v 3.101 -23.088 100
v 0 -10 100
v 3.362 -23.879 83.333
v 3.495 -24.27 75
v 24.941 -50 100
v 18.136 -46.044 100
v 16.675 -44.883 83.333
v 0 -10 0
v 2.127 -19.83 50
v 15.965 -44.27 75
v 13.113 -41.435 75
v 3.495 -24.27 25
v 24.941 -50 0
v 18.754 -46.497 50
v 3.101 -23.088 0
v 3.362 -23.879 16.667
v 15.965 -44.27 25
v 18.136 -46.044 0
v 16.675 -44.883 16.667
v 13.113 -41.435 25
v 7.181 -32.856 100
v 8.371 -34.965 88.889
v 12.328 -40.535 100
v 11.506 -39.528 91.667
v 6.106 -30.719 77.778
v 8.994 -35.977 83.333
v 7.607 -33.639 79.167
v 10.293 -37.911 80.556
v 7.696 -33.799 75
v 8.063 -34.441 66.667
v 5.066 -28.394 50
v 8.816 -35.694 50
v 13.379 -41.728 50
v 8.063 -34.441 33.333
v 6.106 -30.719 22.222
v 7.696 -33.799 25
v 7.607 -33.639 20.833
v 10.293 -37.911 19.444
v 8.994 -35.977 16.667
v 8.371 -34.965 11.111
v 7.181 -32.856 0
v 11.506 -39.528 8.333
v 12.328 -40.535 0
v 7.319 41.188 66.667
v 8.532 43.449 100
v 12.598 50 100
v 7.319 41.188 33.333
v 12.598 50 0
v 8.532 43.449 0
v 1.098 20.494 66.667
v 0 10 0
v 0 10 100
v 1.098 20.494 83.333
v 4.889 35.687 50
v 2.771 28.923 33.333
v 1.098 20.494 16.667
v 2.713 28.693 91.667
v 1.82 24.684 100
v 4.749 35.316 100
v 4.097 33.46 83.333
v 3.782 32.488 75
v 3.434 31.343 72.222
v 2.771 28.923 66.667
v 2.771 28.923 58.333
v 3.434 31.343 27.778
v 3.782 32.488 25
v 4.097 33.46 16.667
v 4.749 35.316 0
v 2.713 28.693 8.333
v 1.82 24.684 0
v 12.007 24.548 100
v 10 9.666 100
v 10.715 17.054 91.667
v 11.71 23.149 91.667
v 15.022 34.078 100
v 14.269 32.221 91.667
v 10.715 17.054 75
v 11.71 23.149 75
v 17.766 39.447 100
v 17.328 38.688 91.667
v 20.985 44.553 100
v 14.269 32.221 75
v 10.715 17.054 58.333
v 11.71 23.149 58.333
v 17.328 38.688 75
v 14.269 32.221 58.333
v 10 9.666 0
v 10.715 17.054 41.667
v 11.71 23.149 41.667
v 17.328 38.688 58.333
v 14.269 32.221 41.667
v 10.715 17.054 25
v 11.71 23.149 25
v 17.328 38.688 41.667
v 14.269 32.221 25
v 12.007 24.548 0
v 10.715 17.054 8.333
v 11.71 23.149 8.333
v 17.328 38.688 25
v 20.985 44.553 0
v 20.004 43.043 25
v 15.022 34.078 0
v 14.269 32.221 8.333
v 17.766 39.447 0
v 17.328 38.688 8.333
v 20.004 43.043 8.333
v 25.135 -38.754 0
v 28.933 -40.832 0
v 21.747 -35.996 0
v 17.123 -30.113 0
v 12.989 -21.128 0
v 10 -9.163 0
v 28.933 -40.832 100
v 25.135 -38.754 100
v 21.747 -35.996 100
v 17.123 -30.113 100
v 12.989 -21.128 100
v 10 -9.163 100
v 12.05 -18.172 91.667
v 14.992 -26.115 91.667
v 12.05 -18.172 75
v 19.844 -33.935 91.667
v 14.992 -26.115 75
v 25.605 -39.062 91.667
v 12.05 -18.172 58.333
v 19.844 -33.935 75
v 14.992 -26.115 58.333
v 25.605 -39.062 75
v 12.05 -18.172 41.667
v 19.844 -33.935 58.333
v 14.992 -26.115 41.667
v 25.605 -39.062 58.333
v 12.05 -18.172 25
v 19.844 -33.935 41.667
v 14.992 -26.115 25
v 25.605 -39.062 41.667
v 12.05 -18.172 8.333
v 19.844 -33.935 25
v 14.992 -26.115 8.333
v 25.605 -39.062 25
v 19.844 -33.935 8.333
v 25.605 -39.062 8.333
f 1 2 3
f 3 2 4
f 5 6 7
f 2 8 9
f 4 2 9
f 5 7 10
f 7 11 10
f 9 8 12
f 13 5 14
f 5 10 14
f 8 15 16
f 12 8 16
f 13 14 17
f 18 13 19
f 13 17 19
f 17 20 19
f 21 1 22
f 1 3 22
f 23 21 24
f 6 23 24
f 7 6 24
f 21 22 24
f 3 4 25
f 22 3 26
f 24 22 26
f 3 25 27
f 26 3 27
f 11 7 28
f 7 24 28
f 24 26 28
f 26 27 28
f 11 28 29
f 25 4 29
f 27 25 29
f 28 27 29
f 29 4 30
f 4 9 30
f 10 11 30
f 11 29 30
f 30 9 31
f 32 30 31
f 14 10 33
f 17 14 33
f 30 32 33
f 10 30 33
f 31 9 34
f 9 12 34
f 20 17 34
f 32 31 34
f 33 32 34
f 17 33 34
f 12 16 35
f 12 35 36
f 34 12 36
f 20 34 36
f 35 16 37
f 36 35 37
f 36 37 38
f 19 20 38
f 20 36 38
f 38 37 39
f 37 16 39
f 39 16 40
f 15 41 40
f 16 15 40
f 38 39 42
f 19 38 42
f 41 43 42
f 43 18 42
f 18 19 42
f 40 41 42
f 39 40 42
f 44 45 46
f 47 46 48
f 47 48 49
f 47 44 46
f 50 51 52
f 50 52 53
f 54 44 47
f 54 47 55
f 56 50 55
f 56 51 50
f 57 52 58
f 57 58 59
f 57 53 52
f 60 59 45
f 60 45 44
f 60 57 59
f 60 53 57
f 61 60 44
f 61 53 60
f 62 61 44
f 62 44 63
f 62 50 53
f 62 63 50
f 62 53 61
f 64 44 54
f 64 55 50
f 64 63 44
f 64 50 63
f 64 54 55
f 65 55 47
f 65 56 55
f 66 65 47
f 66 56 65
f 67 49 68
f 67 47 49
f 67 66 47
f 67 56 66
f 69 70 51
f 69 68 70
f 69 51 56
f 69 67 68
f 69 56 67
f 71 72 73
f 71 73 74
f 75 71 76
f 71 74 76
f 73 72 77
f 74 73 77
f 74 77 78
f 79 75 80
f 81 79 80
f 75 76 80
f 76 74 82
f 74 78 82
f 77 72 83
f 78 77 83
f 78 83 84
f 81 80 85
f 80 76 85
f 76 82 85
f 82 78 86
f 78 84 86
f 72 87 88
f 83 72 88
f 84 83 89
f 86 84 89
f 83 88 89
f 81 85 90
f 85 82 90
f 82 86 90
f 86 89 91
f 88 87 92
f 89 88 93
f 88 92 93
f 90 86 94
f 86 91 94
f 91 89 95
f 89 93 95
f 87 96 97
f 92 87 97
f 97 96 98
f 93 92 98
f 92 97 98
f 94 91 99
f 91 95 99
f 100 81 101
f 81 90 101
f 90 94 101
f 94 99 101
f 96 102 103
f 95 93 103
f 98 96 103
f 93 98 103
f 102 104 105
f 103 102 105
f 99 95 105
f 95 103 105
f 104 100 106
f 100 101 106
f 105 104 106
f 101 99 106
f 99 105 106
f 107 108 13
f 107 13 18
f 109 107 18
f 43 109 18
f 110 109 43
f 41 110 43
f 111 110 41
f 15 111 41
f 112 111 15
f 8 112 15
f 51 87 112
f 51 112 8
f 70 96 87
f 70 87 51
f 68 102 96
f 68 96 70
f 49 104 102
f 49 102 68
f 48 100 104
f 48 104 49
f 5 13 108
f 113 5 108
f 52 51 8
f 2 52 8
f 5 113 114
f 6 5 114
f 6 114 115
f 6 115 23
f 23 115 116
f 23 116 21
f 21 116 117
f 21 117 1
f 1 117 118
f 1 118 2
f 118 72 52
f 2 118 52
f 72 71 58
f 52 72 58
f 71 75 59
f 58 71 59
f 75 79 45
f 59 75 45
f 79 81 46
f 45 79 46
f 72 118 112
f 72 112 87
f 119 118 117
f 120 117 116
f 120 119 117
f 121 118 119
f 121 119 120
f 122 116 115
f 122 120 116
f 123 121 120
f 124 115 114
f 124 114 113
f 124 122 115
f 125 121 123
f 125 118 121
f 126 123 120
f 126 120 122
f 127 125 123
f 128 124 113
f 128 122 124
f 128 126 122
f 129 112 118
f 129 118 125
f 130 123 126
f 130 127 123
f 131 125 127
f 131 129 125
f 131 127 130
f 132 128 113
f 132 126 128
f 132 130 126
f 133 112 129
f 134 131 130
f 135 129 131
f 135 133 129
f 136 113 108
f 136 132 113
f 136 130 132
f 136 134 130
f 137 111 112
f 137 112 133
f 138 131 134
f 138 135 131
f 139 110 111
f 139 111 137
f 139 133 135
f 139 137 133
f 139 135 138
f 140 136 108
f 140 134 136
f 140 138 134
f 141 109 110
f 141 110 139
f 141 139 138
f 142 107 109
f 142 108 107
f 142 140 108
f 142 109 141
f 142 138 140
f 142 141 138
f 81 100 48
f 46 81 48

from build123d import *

# Parameters (mm, degrees)
BOSS_EXTRUDE1_DEPTH = 100


with BuildPart() as part:
    # Sketch2 → Boss-Extrude1 (new body)
    with BuildSketch(Plane.XY):
        with BuildLine():
            add(Edge.make_bspline(
                [(0, 10), (1.533515377, 33.319151282), (7.303166768, 41.847313143), (12.598069813, 50)],
                knots=[0, 0, 0, 0, 1, 1, 1, 1], degree=3))
            Line((0, 10), (0, 0))
            Line((0, 0), (0, -10))
            add(Edge.make_bspline(
                [(0, -10), (5.162408831, -41.387474282), (24.940857621, -50)],
                knots=[0, 0, 0, 1, 1, 1], degree=2))
            Line((24.940857621, -50), (28.933264328, -40.831538368))
            add(Edge.make_bspline(
                [(10, -9.163474156), (10.056385248, -9.489994067), (10.218691454, -10.40274145), (10.608632812, -12.423582905), (11.217159707, -15.147367418), (12.036197112, -18.205876092), (13.241421003, -22.010184853), (14.946624948, -26.249584187), (17.264049235, -30.529570228), (19.809393711, -34.048772515), (22.561889728, -36.886540275), (25.055614435, -38.769105307), (27.20346958, -40.024321521), (28.35268275, -40.578724115), (28.933264328, -40.831538368)],
                knots=[0.013914319, 0.013914319, 0.013914319, 0.013914319, 0.03125, 0.0625, 0.125, 0.1875, 0.25, 0.375, 0.5, 0.625, 0.75, 0.875, 0.9375, 1, 1, 1, 1], degree=3))
            Line((10, -9.163474156), (10, 0))
            Line((10, 0), (10, 9.66613227))
            add(Edge.make_bspline(
                [(10, 9.66613227), (10.044832415, 10.325668243), (10.145323413, 11.665207775), (10.370656318, 14.172612644), (10.703199446, 17.109625288), (11.171932341, 20.302311995), (11.878481202, 24.159772501), (12.891303178, 28.284538206), (14.25087497, 32.33124201), (15.719533079, 35.71915175), (17.301714969, 38.710204086), (18.75029356, 41.091588426), (19.993631129, 43.030159771), (20.657608588, 44.049863049), (20.984546989, 44.553257801)],
                knots=[0.004937345, 0.004937345, 0.004937345, 0.004937345, 0.036033053, 0.067128761, 0.129320177, 0.191511593, 0.253703009, 0.378085841, 0.502468673, 0.626851505, 0.751234336, 0.875617168, 0.937808584, 1, 1, 1, 1], degree=3))
            Line((20.984546989, 44.553257801), (12.598069813, 50))
        make_face()
    extrude(amount=BOSS_EXTRUDE1_DEPTH)


solid = part.part
